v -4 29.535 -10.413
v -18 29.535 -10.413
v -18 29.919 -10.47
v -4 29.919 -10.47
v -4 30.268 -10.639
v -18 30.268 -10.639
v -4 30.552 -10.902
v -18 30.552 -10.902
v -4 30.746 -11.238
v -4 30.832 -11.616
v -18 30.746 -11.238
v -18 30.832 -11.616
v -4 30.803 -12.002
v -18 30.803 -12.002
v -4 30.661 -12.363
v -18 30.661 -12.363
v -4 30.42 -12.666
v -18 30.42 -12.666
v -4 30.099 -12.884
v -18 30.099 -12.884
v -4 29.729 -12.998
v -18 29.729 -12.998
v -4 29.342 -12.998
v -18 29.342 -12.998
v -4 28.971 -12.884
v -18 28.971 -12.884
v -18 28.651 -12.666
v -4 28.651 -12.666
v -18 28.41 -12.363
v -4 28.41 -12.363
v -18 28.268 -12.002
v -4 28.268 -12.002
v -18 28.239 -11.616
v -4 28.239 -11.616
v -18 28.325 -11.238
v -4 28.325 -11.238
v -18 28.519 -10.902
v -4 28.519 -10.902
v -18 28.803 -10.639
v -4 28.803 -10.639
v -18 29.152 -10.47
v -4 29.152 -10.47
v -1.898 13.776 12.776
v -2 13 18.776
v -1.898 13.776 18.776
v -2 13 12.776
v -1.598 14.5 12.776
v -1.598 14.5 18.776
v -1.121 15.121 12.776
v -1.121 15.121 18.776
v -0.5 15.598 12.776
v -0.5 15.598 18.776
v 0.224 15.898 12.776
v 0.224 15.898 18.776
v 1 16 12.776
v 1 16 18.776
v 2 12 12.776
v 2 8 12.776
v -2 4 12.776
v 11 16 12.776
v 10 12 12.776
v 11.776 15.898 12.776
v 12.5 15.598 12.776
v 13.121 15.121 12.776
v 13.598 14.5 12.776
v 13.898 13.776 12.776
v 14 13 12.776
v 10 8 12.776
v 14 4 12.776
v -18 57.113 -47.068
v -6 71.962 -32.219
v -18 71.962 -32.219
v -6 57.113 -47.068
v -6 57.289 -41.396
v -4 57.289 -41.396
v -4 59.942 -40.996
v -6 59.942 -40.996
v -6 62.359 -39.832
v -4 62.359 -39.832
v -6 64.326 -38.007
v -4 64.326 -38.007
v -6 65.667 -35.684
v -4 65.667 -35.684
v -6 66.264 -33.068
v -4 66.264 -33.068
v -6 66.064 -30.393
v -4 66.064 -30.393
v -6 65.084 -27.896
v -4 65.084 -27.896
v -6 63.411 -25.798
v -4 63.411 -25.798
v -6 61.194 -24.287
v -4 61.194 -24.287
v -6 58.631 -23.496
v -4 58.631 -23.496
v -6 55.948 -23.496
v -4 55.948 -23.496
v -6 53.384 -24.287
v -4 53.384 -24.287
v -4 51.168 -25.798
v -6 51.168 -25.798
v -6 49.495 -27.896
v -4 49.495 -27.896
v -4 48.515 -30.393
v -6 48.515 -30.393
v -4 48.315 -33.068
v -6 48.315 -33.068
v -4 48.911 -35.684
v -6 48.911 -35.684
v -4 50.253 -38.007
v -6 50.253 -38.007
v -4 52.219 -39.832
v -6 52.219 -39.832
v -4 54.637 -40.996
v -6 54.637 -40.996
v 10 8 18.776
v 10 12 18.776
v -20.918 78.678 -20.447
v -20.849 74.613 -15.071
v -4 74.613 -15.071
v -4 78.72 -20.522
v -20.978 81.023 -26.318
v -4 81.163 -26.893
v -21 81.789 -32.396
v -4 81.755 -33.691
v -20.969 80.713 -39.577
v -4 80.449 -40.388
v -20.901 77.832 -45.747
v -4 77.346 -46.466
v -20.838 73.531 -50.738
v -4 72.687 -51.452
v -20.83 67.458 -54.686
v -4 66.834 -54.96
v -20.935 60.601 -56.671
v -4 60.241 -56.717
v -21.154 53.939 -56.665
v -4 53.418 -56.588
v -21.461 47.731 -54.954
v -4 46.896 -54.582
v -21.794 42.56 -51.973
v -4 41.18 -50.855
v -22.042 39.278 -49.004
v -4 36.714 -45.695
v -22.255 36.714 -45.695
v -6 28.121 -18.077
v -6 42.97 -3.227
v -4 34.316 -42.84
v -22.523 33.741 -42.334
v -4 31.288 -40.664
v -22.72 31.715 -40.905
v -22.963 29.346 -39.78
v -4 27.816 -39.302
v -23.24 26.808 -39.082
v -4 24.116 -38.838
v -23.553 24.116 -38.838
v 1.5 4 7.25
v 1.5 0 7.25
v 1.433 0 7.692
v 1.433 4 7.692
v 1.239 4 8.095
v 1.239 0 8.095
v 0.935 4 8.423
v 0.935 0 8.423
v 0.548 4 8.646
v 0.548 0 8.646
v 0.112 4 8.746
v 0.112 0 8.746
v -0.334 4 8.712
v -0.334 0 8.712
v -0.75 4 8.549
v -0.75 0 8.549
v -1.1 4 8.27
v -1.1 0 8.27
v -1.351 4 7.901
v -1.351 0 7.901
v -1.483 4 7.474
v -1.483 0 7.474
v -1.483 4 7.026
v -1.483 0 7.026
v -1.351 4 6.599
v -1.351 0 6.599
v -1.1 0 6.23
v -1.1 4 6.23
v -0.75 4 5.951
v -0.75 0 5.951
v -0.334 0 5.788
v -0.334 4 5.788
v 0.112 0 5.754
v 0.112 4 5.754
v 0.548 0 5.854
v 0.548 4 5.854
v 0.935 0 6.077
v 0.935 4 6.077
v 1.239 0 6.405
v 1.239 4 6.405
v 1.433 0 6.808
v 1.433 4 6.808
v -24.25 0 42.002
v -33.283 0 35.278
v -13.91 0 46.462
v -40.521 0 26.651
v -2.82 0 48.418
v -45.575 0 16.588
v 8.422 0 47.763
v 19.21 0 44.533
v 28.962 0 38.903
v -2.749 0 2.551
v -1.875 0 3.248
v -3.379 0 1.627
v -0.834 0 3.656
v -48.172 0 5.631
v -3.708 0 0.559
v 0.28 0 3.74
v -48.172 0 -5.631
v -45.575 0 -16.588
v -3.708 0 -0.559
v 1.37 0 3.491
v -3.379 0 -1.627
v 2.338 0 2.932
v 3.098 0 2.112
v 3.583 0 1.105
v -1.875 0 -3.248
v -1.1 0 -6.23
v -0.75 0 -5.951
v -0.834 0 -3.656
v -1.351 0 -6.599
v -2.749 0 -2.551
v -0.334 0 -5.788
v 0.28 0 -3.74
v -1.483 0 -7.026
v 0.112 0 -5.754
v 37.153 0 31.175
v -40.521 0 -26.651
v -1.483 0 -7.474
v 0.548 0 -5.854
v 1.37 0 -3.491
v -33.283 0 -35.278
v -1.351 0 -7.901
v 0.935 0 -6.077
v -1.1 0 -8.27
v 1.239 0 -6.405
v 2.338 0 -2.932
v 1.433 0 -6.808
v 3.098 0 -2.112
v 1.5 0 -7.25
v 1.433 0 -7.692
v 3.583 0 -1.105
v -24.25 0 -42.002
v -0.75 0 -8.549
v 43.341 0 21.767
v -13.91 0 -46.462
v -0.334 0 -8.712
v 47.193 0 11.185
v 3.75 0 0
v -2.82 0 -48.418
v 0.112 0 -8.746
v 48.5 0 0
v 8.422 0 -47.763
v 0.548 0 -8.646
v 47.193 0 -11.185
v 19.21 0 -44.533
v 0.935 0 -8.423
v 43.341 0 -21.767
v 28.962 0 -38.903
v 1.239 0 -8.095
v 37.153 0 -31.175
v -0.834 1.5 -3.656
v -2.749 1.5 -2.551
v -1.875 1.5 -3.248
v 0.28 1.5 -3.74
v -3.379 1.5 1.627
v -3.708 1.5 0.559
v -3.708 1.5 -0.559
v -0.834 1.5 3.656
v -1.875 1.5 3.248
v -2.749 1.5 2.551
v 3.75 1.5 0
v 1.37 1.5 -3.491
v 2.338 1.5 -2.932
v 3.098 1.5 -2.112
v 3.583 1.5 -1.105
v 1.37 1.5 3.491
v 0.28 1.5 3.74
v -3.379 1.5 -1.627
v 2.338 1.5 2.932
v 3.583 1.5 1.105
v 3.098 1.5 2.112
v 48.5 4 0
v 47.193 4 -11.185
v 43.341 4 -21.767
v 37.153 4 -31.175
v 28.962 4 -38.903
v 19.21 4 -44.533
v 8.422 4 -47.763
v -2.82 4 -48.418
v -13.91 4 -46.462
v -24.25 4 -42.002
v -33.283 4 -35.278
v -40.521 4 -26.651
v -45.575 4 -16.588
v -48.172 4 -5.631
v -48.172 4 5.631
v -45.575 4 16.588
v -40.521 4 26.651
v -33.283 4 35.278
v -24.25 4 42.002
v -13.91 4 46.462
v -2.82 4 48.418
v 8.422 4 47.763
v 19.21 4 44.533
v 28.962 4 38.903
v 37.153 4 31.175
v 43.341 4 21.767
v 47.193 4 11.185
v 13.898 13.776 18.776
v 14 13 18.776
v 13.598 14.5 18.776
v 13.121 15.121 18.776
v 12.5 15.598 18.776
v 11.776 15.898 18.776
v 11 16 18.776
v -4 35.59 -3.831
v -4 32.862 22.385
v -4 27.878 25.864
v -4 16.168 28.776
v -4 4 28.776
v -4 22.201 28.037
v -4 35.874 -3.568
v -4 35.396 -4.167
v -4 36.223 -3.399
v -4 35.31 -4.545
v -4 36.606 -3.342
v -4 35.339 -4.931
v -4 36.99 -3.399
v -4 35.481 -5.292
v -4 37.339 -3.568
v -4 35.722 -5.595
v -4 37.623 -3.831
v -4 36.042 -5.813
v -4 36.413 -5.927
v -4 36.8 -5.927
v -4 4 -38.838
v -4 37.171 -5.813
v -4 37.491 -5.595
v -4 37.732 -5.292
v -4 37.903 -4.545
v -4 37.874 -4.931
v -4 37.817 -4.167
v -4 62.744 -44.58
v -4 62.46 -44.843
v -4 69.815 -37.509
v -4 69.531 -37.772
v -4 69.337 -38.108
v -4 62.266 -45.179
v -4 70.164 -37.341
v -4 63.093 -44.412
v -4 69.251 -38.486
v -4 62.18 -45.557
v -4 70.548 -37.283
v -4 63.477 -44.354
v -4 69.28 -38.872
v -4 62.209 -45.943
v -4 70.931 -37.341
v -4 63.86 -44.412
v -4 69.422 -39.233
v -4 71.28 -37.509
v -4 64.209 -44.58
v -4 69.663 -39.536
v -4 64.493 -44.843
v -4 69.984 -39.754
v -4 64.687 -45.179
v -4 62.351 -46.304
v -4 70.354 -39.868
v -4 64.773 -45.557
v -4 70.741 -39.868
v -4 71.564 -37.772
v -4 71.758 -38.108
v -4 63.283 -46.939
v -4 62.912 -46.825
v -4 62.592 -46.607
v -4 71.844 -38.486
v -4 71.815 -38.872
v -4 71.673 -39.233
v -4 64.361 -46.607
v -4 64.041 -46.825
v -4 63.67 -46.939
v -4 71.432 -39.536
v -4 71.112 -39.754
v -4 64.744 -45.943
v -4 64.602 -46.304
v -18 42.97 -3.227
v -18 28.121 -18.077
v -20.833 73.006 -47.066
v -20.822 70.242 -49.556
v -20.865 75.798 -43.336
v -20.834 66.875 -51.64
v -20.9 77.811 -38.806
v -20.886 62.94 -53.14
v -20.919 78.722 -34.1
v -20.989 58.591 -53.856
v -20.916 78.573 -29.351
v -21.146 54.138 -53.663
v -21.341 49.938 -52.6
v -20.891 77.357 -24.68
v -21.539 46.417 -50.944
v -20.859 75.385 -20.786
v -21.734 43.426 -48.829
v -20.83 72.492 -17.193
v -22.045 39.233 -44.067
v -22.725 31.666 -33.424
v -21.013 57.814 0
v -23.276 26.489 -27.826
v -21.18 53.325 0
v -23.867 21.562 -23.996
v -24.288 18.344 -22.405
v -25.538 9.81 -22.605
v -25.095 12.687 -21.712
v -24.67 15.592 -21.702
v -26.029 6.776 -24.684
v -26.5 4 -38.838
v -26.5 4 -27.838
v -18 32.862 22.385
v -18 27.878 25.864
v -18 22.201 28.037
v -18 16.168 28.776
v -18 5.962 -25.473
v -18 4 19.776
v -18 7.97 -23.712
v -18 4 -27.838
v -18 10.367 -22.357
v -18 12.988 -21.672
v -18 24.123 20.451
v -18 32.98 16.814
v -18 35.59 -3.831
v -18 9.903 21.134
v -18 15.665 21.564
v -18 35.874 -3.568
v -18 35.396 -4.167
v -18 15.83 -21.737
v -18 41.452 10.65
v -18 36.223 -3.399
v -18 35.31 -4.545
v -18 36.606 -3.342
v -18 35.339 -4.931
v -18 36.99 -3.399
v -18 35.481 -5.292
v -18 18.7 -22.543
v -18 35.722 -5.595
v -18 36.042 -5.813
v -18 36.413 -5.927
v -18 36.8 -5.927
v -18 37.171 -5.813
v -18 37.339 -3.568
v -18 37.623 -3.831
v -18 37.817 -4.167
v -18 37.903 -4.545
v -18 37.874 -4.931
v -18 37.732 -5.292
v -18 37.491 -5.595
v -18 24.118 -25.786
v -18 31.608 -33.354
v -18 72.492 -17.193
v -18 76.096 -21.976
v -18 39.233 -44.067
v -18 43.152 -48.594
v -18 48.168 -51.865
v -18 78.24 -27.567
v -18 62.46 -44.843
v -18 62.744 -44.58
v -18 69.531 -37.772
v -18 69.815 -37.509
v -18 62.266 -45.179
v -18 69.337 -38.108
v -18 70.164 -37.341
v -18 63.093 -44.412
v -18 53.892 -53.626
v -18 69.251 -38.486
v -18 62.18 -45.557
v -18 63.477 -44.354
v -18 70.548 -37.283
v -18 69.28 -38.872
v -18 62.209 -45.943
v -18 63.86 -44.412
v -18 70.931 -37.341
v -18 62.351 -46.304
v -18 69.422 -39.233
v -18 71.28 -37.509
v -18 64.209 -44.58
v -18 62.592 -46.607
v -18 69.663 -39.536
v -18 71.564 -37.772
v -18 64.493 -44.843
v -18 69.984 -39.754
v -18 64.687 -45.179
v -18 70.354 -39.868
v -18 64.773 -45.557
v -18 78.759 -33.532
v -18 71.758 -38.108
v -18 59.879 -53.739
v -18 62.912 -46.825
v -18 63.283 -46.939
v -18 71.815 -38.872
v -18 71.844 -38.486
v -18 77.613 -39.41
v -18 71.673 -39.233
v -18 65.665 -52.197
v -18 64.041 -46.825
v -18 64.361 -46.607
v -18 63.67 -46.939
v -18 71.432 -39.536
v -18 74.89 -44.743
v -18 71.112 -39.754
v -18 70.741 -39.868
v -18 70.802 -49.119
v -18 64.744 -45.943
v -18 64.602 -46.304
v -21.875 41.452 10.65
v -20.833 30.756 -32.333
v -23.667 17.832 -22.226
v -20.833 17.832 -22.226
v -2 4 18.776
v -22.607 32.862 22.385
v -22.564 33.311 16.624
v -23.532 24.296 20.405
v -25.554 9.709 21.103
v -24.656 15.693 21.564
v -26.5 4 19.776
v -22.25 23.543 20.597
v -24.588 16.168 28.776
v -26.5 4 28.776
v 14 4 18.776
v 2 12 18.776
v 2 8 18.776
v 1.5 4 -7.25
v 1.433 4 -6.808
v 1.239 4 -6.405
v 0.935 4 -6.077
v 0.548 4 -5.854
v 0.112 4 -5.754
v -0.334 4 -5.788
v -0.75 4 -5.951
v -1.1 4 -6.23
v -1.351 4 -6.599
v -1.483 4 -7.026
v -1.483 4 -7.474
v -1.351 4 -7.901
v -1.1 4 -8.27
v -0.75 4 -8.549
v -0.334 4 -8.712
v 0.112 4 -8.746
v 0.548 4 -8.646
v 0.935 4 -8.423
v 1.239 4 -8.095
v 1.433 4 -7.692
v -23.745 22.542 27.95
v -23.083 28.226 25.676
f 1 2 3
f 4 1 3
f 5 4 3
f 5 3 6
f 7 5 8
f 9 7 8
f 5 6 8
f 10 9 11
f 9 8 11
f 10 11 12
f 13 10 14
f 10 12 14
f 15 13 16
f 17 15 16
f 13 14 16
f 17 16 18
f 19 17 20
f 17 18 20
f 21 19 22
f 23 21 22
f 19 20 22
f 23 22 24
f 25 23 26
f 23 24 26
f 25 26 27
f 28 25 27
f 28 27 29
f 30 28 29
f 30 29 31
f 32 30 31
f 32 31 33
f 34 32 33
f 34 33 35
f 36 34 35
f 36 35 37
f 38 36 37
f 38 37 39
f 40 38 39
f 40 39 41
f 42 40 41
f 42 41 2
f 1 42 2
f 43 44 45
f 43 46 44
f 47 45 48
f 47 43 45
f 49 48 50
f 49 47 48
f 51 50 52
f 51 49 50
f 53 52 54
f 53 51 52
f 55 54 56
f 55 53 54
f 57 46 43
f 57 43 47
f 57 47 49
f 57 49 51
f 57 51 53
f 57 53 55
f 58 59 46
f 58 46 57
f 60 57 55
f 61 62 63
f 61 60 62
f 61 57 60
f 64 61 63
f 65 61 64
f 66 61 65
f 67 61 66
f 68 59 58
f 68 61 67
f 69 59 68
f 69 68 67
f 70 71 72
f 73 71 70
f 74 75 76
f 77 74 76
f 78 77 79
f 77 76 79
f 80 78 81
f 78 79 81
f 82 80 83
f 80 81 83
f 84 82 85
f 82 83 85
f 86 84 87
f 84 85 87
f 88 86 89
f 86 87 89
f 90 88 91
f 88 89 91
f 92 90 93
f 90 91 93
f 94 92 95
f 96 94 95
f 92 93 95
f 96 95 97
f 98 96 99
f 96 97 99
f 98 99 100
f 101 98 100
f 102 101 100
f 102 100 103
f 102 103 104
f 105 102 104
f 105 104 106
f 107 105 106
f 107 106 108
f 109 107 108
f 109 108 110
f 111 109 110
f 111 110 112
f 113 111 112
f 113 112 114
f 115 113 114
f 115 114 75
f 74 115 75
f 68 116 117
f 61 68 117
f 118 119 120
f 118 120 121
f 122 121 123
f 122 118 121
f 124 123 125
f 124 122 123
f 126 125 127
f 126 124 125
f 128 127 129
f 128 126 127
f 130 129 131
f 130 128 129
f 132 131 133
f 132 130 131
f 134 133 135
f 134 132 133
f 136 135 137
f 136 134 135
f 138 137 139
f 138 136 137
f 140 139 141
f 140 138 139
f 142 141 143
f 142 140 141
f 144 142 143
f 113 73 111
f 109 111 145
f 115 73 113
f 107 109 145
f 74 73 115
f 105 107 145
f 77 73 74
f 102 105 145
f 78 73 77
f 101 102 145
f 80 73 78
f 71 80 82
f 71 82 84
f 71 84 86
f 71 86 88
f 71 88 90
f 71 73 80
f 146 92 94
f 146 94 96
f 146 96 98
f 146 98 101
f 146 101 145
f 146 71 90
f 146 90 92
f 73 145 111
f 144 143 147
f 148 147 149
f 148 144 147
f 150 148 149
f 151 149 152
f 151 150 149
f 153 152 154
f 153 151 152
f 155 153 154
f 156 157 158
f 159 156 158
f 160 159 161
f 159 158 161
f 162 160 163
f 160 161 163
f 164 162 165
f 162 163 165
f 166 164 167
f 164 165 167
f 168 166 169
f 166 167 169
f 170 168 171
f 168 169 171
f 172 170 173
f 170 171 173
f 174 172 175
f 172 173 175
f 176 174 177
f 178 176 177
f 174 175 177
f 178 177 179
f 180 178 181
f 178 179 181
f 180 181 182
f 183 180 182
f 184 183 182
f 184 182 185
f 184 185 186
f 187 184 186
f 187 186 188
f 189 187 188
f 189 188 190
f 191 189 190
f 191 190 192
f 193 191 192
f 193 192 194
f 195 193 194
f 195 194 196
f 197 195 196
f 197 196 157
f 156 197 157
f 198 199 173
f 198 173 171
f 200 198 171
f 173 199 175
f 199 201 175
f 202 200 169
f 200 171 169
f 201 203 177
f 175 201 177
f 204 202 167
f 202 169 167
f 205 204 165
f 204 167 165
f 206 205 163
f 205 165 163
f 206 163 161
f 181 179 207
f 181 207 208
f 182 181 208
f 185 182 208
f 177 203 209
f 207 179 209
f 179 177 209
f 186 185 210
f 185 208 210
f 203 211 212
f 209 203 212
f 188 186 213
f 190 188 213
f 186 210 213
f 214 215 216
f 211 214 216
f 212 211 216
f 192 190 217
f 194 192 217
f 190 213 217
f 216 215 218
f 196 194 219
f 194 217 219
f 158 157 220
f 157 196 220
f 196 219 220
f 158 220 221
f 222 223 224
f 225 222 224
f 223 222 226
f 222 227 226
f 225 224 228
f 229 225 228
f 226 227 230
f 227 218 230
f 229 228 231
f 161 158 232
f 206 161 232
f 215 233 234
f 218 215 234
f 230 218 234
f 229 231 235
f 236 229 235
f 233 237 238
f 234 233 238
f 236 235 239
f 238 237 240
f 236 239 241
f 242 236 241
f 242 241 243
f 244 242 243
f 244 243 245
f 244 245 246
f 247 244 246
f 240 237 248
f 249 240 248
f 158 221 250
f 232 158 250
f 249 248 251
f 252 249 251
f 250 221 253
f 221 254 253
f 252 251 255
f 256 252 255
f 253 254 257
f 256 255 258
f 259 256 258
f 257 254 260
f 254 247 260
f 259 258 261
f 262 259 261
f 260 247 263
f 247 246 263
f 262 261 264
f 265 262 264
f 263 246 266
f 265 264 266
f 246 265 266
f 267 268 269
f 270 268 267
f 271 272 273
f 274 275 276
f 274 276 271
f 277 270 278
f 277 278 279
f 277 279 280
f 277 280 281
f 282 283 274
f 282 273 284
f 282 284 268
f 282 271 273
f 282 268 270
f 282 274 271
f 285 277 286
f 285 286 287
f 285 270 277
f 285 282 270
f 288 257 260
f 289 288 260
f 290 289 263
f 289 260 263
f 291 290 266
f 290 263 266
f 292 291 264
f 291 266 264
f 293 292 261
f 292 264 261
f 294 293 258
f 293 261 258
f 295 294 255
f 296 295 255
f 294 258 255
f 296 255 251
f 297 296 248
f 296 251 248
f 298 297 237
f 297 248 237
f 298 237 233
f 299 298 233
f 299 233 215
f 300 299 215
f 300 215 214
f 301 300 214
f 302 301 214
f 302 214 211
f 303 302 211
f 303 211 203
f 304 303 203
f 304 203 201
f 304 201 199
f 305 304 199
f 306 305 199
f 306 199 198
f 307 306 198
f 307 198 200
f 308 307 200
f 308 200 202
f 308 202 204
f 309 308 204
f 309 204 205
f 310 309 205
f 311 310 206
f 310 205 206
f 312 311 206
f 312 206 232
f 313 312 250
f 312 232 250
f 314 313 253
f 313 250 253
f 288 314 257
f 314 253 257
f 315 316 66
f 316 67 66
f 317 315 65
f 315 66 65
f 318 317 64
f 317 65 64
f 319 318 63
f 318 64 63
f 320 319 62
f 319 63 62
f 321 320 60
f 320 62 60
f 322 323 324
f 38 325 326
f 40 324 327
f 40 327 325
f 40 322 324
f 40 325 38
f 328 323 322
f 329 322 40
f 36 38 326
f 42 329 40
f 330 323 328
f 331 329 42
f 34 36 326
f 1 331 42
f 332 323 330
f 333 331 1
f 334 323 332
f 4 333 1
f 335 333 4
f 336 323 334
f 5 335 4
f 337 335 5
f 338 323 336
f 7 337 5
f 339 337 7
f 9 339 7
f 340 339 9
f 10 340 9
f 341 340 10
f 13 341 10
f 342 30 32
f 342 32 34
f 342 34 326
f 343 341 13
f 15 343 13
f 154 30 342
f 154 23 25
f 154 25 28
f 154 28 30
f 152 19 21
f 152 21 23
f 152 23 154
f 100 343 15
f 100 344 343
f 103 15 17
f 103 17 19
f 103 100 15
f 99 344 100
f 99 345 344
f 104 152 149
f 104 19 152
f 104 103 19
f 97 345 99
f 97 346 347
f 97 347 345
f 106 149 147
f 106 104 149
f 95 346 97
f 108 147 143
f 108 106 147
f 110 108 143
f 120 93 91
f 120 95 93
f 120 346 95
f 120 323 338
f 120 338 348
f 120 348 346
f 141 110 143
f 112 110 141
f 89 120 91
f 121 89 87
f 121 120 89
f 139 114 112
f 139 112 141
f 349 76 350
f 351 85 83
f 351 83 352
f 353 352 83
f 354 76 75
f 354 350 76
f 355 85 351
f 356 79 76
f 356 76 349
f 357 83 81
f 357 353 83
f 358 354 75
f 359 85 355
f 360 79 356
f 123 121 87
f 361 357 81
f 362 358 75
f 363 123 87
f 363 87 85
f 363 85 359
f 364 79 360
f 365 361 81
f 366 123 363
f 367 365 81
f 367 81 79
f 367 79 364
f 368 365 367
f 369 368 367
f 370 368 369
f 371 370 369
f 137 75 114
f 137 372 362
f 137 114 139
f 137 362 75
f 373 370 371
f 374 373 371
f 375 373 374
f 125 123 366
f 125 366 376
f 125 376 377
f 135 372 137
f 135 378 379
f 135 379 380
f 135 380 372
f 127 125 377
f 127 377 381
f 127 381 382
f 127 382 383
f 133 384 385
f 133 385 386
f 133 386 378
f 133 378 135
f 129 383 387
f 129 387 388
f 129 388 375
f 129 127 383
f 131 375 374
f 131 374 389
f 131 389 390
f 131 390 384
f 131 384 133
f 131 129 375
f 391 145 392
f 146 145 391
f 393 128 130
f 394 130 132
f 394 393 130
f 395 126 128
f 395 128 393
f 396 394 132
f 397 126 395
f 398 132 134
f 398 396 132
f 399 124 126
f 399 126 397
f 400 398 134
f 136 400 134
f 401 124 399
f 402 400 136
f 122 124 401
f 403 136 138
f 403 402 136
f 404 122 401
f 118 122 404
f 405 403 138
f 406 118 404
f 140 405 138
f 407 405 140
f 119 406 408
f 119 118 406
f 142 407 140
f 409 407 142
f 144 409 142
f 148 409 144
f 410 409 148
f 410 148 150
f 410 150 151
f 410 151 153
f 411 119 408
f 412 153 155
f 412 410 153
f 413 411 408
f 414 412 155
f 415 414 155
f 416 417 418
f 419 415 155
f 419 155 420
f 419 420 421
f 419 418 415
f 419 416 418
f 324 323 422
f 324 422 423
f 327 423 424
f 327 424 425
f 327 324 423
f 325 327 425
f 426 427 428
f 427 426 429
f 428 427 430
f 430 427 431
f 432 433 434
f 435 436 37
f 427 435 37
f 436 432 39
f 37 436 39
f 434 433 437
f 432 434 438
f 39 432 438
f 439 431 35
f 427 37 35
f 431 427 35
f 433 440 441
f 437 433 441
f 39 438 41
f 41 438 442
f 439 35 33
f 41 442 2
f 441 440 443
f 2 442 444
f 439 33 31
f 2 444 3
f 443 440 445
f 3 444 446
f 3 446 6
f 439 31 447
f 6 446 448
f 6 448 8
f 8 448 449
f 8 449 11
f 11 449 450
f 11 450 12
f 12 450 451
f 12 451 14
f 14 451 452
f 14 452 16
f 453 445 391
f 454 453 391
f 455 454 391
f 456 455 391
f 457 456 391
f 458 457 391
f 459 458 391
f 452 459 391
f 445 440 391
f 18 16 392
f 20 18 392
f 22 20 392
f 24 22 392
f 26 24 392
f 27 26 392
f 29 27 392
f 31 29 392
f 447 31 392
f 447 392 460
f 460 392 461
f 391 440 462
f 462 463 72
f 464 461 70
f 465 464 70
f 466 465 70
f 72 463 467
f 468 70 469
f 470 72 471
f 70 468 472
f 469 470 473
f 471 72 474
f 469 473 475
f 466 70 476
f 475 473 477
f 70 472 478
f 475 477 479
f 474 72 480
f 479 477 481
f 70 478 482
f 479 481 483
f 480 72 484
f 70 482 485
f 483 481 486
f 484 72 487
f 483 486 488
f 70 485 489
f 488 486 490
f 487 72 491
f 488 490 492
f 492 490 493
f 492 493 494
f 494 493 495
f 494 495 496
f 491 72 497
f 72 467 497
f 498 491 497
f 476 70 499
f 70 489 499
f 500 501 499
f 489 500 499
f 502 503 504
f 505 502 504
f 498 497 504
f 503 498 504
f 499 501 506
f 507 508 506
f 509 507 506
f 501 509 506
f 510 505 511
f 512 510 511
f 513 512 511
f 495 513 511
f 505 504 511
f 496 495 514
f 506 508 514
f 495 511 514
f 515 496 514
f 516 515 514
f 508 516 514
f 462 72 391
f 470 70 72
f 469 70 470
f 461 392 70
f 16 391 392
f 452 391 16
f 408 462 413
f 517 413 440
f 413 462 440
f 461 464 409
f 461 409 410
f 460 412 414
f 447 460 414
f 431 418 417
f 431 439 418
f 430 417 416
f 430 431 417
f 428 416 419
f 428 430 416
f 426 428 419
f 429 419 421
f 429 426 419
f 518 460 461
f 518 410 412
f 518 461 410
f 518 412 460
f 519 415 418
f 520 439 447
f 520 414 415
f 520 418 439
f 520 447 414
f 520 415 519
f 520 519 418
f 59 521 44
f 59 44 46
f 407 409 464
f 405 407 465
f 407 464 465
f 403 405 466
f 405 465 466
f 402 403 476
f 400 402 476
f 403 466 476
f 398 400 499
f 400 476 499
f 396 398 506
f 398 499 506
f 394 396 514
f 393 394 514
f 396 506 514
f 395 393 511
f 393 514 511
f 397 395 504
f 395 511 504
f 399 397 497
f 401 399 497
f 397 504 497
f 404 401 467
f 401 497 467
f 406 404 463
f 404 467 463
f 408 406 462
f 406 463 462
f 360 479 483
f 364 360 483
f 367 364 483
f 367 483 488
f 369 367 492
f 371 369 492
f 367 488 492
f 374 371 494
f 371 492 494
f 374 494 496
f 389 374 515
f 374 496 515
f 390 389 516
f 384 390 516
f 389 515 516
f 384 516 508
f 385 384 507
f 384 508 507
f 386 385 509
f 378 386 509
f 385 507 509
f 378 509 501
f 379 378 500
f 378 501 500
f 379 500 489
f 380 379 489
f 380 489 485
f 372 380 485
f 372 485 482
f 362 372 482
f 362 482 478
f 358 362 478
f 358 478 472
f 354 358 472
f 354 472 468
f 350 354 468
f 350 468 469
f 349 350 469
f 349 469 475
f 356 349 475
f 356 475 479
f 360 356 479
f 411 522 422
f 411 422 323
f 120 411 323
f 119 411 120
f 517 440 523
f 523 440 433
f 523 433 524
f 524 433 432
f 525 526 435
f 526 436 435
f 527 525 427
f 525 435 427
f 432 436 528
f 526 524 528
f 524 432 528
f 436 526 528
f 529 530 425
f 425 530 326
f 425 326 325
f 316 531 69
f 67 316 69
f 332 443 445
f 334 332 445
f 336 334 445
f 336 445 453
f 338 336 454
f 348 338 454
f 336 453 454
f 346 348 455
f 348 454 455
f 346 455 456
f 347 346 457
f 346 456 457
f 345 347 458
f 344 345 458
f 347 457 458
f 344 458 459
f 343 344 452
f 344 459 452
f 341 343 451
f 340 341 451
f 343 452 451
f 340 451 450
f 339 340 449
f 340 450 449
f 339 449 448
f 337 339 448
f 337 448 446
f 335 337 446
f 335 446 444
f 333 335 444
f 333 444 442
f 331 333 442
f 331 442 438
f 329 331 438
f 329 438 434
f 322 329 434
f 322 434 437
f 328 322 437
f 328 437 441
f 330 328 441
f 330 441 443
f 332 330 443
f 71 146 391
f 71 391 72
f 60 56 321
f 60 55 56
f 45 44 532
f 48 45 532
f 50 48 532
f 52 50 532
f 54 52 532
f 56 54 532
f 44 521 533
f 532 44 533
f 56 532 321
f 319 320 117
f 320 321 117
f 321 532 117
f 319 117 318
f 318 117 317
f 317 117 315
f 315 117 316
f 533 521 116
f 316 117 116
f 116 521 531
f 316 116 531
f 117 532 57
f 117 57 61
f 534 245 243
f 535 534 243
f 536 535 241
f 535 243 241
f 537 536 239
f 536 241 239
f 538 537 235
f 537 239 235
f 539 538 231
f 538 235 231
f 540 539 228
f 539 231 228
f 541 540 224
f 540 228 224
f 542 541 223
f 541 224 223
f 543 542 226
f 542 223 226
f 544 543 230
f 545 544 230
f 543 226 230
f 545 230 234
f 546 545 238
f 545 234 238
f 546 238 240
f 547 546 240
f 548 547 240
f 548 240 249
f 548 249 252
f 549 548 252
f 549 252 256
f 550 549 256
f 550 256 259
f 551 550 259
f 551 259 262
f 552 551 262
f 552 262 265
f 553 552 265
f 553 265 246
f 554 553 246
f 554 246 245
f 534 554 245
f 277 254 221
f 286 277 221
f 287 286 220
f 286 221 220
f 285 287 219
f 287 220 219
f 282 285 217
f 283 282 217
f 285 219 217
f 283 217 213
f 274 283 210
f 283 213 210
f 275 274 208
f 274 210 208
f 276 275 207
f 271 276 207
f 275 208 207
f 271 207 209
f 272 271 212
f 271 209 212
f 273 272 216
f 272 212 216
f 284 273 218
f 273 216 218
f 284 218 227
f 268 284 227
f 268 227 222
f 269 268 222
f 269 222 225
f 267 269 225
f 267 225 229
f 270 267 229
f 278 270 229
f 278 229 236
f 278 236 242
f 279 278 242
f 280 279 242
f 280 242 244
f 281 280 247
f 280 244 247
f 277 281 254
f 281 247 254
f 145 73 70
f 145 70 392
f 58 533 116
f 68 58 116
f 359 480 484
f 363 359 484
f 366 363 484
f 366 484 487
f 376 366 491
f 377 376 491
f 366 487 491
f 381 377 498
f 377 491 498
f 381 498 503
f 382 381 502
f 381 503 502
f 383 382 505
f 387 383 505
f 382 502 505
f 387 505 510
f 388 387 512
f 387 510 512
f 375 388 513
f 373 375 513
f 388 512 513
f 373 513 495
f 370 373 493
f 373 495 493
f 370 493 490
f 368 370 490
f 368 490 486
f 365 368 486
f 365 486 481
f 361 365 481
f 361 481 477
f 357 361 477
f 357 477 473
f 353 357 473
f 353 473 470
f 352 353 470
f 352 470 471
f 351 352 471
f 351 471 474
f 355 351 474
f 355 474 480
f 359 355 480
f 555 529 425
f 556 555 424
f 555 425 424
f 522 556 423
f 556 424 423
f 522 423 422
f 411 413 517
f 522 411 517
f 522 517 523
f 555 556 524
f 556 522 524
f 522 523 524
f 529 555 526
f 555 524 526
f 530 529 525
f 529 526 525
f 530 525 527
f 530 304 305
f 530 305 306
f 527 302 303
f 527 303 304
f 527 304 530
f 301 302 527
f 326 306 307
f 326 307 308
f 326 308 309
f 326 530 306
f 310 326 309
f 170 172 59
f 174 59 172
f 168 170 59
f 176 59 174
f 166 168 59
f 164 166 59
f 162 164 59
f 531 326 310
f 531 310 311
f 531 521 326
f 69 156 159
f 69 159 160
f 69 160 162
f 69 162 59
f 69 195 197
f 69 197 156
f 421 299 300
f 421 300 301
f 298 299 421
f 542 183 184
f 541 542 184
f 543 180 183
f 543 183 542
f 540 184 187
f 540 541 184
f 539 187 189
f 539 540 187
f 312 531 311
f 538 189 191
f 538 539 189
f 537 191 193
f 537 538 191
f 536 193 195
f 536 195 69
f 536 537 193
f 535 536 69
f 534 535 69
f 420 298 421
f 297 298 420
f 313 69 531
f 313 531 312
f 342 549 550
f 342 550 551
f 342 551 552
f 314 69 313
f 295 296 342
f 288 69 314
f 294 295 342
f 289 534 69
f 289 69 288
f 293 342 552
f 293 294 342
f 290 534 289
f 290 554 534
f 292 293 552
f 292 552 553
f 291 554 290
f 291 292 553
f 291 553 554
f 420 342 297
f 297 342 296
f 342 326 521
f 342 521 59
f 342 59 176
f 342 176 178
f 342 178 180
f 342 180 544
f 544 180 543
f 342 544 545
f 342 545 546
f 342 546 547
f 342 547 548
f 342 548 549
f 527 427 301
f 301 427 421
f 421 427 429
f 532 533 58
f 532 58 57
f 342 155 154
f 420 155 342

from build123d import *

# Parameters (mm, degrees)
SKETCH2_R                = 48.5
BOSS_EXTRUDE1_DEPTH      = 4
SKETCH4_R                = 1.5
CUT_EXTRUDE2_DEPTH       = 5
SKETCH5_R                = 3.75
CUT_EXTRUDE3_DEPTH       = 1.5
BOSS_EXTRUDE2_DEPTH      = 14
CUT_EXTRUDE5_REACH       = 44.5
SKETCH9_R                = 1.3
CUT_EXTRUDE6_DEPTH       = 67.5
CUT_EXTRUDE9_REACH       = 46.5
SKETCH11_R               = 9
BOSS_EXTRUDE7_DEPTH      = 9
BOSS_EXTRUDE7_DEPTH_BACK = 14
BOSS_EXTRUDE10_DEPTH     = 9
SKETCH27_W               = 16
SKETCH27_H               = 6
BOSS_EXTRUDE11_DEPTH     = 12
FILLET6_R                = 3
CUT_EXTRUDE16_REACH      = 77.672
SKETCH28_W               = 8
SKETCH28_H               = 4
CUT_EXTRUDE17_DEPTH      = 49.5
CUT_EXTRUDE17_DEPTH_BACK = 57.89561214


with BuildPart() as part:
    # Sketch2 → Boss-Extrude1 (new body)
    with BuildSketch(Plane(origin=(0, 0, 0), x_dir=(1, 0, 0), z_dir=(0, 1, 0))):
        Circle(SKETCH2_R)
    extrude(amount=BOSS_EXTRUDE1_DEPTH)

    # Sketch4 → Cut-Extrude2 (cut, through all)
    with BuildSketch(Plane.XZ):
        with Locations((0, 7.25)):
            Circle(SKETCH4_R)
        with Locations((0, -7.25)):
            Circle(SKETCH4_R)
    extrude(amount=-CUT_EXTRUDE2_DEPTH, mode=Mode.SUBTRACT)

    # Sketch5 → Cut-Extrude3 (cut)
    with BuildSketch(Plane.XZ):
        Circle(SKETCH5_R)
    extrude(amount=-CUT_EXTRUDE3_DEPTH, mode=Mode.SUBTRACT)

    # Sketch7 → Boss-Extrude2 (add)
    with BuildSketch(Plane(origin=(-4, 0, 0), x_dir=(0, 0, -1), z_dir=(1, 0, 0))):
        with BuildLine():
            Line((35.838240239, 4), (35.838240239, 24.116109522))
            ThreePointArc((35.838240239, 24.116109522), (38.028688753, 32.721810064), (44.066915997, 39.233027943))
            ThreePointArc((44.066915997, 39.233027943), (49.118651286, 70.801932352), (17.192816244, 72.492142963))
            Line((17.192816244, 72.492142963), (-21.454056035, 33.845270684))
            ThreePointArc((-21.454056035, 33.845270684), (-26.873374818, 25.734686963), (-28.776386505, 16.167601154))
            Line((-28.776386505, 16.167601154), (-28.776386505, 4))
            Line((-28.776386505, 4), (35.838240239, 4))
        make_face()
    extrude(amount=-BOSS_EXTRUDE2_DEPTH)

    # Sketch8 → Cut-Extrude5 (cut, up to next)
    with BuildSketch(Plane(origin=(-6, 0, 0), x_dir=(0, 0, -1), z_dir=(1, 0, 0)), mode=Mode.PRIVATE) as cut_extrude5_sk1:
        Polygon((3.227457316, 42.970434849), (32.218835345, 71.961812877), (47.06807775, 57.112570472), (18.076699721, 28.121192444), align=None)
    cut_extrude5_tool1 = extrude(cut_extrude5_sk1.sketch, amount=-CUT_EXTRUDE5_REACH, mode=Mode.PRIVATE) & part.part
    add(cut_extrude5_tool1.solids().sort_by_distance((-6, 50.041503, -25.147768))[0], mode=Mode.SUBTRACT)

    # Sketch9 → Cut-Extrude6 (cut, through all)
    with BuildSketch(Plane.ZY.offset(18)):
        with Locations((-38.582796375, 70.547599315)):
            Circle(SKETCH9_R)
        with Locations((-45.653864187, 63.476531503)):
            Circle(SKETCH9_R)
        with Locations((-11.71273869, 29.535406006)):
            Circle(SKETCH9_R)
        with Locations((-4.641670878, 36.606473818)):
            Circle(SKETCH9_R)
    extrude(amount=-CUT_EXTRUDE6_DEPTH, mode=Mode.SUBTRACT)

    # Sketch11 → Cut-Extrude9 (cut, up to next)
    with BuildSketch(Plane(origin=(-4, 0, 0), x_dir=(0, 0, -1), z_dir=(1, 0, 0)), mode=Mode.PRIVATE) as cut_extrude9_sk1:
        with Locations((32.39561204, 57.289347168)):
            Circle(SKETCH11_R)
    cut_extrude9_tool1 = extrude(cut_extrude9_sk1.sketch, amount=-CUT_EXTRUDE9_REACH, mode=Mode.PRIVATE) & part.part
    add(cut_extrude9_tool1.solids().sort_by_distance((-4, 57.289347, -32.395612))[0], mode=Mode.SUBTRACT)

    # Sketch17 → Boss-Extrude7 (add, two sides)
    with BuildSketch(Plane.ZY.offset(18)) as boss_extrude7_sk:
        with BuildLine():
            ThreePointArc((28.776386505, 16.167601154), (27.123973821, 25.105731079), (22.385173182, 32.862302662))
            ThreePointArc((22.385173182, 32.862302662), (21.926270321, 33.360091302), (21.454056035, 33.845270684))
            Line((21.454056035, 33.845270684), (-17.192816244, 72.492142963))
            Line((-17.192816244, 72.492142963), (20.153274432, 30.85765023))
            ThreePointArc((20.153274432, 30.85765023), (24.322572701, 24.032347355), (25.776386505, 16.167601154))
            Line((25.776386505, 16.167601154), (25.776386505, 4))
            Line((25.776386505, 4), (28.776386505, 4))
            Line((28.776386505, 4), (28.776386505, 16.167601154))
        make_face()
        with BuildLine():
            Line((22.385173182, 32.862302662), (-15.071495901, 74.613463307))
            ThreePointArc((-15.071495901, 74.613463307), (-51.452098623, 72.687409354), (-45.695470037, 36.713541539))
            ThreePointArc((-45.695470037, 36.713541539), (-40.663614001, 31.28752664), (-38.838240239, 24.116109522))
            Line((-38.838240239, 24.116109522), (-38.838240239, 4))
            Line((-38.838240239, 4), (-35.838240239, 4))
            Line((-35.838240239, 4), (-35.838240239, 24.116109522))
            ThreePointArc((-35.838240239, 24.116109522), (-38.028688753, 32.721810064), (-44.066915997, 39.233027943))
            ThreePointArc((-44.066915997, 39.233027943), (-49.118651286, 70.801932352), (-17.192816244, 72.492142963))
            Line((-17.192816244, 72.492142963), (21.454056035, 33.845270684))
            ThreePointArc((21.454056035, 33.845270684), (21.926270321, 33.360091302), (22.385173182, 32.862302662))
        make_face()
    extrude(amount=BOSS_EXTRUDE7_DEPTH)
    extrude(boss_extrude7_sk.sketch, amount=-BOSS_EXTRUDE7_DEPTH_BACK)

    # Sketch25 → Boss-Extrude10 (add)
    with BuildSketch(Plane.ZY.offset(18)):
        with BuildLine():
            ThreePointArc((-44.066915997, 39.233027943), (-38.028688753, 32.721810064), (-35.838240239, 24.116109522))
            Line((-35.838240239, 24.116109522), (-35.838240239, 4))
            Line((-35.838240239, 4), (-27.838240239, 4))
            add(Edge.make_bspline(
                [(-44.066915997, 39.233027943), (-36.217415427, 34.159241535), (-9.669096592, 17.105596636), (-27.838240239, 4)],
                knots=[0, 0, 0, 0, 1, 1, 1, 1], degree=3))
        make_face()
        with BuildLine():
            add(Edge.make_bspline(
                [(10.649740153, 41.452462744), (25.981861033, 24.35977476), (19.776386505, 4)],
                knots=[0, 0, 0, 1, 1, 1], degree=2))
            Line((19.776386505, 4), (25.776386505, 4))
            Line((25.776386505, 4), (25.776386505, 16.167601154))
            ThreePointArc((25.776386505, 16.167601154), (24.322572701, 24.032347355), (20.153274432, 30.85765023))
            Line((20.153274432, 30.85765023), (10.649740153, 41.452462744))
        make_face()
    extrude(amount=BOSS_EXTRUDE10_DEPTH)

    # Sketch27 → Boss-Extrude11 (add)
    with BuildSketch(Plane(origin=(0, 4, 0), x_dir=(1, 0, 0), z_dir=(0, 1, 0))):
        with Locations((6, -15.776386505)):
            Rectangle(SKETCH27_W, SKETCH27_H)
    extrude(amount=BOSS_EXTRUDE11_DEPTH)

    # Fillet6
    fillet6_edges = [part.edges().sort_by_distance(p)[0] for p in [
        (-2, 16, 15.776386505),
        (14, 16, 15.776386505),
    ]]
    fillet(fillet6_edges, radius=FILLET6_R)

    # Sketch28 → Cut-Extrude16 (cut, up to next)
    with BuildSketch(Plane.XY.offset(18.776386505), mode=Mode.PRIVATE) as cut_extrude16_sk1:
        with Locations((6, 10)):
            Rectangle(SKETCH28_W, SKETCH28_H)
    cut_extrude16_tool1 = extrude(cut_extrude16_sk1.sketch, amount=-CUT_EXTRUDE16_REACH, mode=Mode.PRIVATE) & part.part
    add(cut_extrude16_tool1.solids().sort_by_distance((6, 10, 18.776387))[0], mode=Mode.SUBTRACT)

    # Sketch29 → Cut-Extrude17 (cut, two sides)
    with BuildSketch(Plane.XY) as cut_extrude17_sk:
        with BuildLine():
            Line((-21, 81.789347168), (-27, 81.789347168))
            Line((-27, 81.789347168), (-27, 4))
            Line((-27, 4), (-26.5, 4))
            add(Edge.make_bspline(
                [(-21, 81.789347168), (-19.81566604, 42.545643995), (-26.5, 4)],
                knots=[0, 0, 0, 1, 1, 1], degree=2))
        make_face()
    extrude(amount=CUT_EXTRUDE17_DEPTH, mode=Mode.SUBTRACT)
    extrude(cut_extrude17_sk.sketch, amount=-CUT_EXTRUDE17_DEPTH_BACK, mode=Mode.SUBTRACT)


solid = part.part
